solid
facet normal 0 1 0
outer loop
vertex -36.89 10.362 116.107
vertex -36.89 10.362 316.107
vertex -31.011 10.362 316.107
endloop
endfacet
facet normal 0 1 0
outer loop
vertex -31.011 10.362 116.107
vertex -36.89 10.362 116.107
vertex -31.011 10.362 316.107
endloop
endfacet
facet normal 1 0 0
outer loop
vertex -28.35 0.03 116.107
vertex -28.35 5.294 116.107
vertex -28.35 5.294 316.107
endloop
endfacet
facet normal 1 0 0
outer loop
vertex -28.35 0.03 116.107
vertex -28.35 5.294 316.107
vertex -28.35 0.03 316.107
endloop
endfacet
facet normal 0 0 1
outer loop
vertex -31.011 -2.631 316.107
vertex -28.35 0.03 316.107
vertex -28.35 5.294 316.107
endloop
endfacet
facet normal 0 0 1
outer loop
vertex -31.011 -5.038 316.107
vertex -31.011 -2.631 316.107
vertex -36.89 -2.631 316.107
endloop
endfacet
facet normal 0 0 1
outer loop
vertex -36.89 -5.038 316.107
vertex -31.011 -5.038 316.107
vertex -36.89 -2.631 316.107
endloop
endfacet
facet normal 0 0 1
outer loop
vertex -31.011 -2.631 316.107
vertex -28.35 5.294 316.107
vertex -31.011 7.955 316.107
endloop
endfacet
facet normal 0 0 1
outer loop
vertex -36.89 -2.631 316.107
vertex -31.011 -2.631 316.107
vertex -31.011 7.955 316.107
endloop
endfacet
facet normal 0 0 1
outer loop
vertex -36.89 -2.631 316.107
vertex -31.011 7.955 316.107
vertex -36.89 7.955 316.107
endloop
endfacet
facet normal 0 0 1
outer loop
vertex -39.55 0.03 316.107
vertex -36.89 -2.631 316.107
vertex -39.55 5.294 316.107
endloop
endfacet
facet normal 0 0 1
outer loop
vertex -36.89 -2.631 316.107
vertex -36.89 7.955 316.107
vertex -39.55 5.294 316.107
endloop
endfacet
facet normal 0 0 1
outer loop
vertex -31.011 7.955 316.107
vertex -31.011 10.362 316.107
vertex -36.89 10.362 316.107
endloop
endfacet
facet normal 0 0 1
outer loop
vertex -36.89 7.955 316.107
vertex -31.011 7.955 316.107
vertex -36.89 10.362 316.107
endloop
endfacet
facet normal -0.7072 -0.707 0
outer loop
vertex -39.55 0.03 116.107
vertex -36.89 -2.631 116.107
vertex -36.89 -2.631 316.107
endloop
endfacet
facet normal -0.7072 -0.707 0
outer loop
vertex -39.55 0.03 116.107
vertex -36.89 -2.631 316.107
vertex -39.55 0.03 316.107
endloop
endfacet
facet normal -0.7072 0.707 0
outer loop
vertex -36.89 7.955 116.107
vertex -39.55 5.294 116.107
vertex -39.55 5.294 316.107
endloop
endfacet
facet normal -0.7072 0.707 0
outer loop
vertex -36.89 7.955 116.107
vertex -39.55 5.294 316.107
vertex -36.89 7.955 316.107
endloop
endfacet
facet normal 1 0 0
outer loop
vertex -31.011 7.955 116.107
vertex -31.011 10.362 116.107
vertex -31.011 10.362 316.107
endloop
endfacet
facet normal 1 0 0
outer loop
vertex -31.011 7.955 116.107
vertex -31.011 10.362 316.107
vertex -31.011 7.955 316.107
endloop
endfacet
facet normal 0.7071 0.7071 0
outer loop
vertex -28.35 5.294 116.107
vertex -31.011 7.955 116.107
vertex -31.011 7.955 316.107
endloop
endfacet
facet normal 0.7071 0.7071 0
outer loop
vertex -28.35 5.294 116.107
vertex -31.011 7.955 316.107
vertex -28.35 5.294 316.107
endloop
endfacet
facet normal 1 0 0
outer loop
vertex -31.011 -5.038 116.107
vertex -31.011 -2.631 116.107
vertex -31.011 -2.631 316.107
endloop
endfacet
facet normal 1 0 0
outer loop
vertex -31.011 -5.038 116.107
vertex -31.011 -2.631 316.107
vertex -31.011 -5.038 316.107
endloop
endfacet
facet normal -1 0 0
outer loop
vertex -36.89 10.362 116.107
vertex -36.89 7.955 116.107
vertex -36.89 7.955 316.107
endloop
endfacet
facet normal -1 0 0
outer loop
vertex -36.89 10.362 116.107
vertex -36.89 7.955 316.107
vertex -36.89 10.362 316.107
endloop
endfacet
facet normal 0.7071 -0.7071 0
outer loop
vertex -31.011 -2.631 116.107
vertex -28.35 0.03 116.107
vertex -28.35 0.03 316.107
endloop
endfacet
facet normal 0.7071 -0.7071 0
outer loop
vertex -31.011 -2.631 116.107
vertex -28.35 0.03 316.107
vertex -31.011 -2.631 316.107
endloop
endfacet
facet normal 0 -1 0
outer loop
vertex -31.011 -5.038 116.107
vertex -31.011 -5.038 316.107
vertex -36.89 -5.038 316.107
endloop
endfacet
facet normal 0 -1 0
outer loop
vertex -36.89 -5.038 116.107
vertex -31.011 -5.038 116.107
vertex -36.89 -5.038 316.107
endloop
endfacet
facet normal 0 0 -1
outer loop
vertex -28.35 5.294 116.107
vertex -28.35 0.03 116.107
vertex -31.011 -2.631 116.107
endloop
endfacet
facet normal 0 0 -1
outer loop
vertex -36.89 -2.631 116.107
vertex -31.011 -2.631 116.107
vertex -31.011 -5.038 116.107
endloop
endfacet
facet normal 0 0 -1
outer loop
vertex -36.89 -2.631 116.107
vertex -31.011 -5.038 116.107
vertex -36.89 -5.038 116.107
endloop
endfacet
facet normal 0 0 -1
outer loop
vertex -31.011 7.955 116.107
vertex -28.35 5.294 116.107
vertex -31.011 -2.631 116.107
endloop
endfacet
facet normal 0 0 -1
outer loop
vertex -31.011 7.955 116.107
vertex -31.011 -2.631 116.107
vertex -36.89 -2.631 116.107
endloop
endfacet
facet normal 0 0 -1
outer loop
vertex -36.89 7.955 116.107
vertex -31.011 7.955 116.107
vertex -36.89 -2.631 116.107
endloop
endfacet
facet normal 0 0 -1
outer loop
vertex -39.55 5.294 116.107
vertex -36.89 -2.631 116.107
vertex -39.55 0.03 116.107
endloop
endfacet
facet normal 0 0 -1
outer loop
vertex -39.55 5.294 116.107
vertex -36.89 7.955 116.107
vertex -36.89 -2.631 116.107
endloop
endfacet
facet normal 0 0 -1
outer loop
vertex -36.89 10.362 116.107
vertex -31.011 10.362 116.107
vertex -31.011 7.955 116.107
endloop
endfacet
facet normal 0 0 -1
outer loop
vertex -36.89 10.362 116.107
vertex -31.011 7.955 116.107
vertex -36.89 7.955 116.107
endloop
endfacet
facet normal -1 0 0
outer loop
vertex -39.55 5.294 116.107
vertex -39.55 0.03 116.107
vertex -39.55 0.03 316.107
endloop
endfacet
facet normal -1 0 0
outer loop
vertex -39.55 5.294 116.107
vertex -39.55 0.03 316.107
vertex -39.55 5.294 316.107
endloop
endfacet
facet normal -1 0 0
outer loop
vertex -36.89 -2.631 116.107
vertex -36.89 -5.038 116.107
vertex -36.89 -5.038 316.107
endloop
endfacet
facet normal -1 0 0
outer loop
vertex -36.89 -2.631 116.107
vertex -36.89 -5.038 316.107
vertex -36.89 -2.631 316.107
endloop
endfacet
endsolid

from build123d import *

# Parameters (mm, degrees)
BOSS_EXTRUDE1_DEPTH = 200


with BuildPart() as part:
    # Sketch1 → Boss-Extrude1 (new body)
    with BuildSketch(Plane.XY.offset(116.106580091)):
        Polygon((-39.550290087, 5.294235639), (-36.889629915, 7.954895811), (-36.889629915, 10.362002592), (-31.010950259, 10.362002592), (-31.010950259, 7.954895811), (-28.350290087, 5.294235639), (-28.350290087, 0.029769545), (-31.010950259, -2.630890626), (-31.010950259, -5.037997408), (-36.889629915, -5.037997408), (-36.889629915, -2.630890626), (-39.550290087, 0.029769545), align=None)
    extrude(amount=BOSS_EXTRUDE1_DEPTH)


solid = part.part
